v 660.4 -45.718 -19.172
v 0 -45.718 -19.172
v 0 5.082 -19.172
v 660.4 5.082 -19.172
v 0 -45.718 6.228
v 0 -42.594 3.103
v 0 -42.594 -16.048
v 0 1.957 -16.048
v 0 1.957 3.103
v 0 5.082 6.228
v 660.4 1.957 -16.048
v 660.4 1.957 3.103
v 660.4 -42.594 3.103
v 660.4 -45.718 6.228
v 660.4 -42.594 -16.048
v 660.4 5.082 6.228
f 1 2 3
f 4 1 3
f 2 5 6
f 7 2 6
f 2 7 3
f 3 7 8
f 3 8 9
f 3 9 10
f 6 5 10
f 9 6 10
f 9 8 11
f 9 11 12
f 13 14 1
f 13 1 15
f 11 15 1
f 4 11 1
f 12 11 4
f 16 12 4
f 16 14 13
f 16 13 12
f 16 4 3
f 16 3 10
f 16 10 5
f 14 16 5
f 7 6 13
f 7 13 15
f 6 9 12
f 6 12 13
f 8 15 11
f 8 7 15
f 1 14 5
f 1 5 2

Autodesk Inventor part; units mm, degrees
ref_plane "YZ Plane" through (0, 0, 0) normal (1, 0, 0) x (0, 1, 0)
ref_plane "XZ Plane" through (0, 0, 0) normal (0, 1, 0) x (-1, 0, 0)
ref_plane "XY Plane" through (0, 0, 0) normal (0, 0, 1) x (1, 0, 0)
sketch "Sketch1" plane through (0, 0, 0) normal (1, 0, 0) x (0, 1, 0)
  line L0 (5.0816, 6.2276) -> (-45.7184, 6.2276)
  line L1 (-45.7184, 6.2276) -> (-45.7184, -19.1724)
  line L2 (-45.7184, -19.1724) -> (5.0816, -19.1724)
  line L3 (5.0816, -19.1724) -> (5.0816, 6.2276)
  line L4 (1.9574, 3.1034) -> (-42.5942, 3.1034)
  line L5 (-42.5942, 3.1034) -> (-42.5942, -16.0482)
  line L6 (-42.5942, -16.0482) -> (1.9574, -16.0482)
  line L7 (1.9574, -16.0482) -> (1.9574, 3.1034)
  point P0 (0, 0)
  dimension "d0" = 50.8
  dimension "d1" = 25.4
  dimension "d2" = 3.1242
extrude "Extrusion1" add sketch "Sketch1" along normal blind 660.4
properties part number "26in box beam"
